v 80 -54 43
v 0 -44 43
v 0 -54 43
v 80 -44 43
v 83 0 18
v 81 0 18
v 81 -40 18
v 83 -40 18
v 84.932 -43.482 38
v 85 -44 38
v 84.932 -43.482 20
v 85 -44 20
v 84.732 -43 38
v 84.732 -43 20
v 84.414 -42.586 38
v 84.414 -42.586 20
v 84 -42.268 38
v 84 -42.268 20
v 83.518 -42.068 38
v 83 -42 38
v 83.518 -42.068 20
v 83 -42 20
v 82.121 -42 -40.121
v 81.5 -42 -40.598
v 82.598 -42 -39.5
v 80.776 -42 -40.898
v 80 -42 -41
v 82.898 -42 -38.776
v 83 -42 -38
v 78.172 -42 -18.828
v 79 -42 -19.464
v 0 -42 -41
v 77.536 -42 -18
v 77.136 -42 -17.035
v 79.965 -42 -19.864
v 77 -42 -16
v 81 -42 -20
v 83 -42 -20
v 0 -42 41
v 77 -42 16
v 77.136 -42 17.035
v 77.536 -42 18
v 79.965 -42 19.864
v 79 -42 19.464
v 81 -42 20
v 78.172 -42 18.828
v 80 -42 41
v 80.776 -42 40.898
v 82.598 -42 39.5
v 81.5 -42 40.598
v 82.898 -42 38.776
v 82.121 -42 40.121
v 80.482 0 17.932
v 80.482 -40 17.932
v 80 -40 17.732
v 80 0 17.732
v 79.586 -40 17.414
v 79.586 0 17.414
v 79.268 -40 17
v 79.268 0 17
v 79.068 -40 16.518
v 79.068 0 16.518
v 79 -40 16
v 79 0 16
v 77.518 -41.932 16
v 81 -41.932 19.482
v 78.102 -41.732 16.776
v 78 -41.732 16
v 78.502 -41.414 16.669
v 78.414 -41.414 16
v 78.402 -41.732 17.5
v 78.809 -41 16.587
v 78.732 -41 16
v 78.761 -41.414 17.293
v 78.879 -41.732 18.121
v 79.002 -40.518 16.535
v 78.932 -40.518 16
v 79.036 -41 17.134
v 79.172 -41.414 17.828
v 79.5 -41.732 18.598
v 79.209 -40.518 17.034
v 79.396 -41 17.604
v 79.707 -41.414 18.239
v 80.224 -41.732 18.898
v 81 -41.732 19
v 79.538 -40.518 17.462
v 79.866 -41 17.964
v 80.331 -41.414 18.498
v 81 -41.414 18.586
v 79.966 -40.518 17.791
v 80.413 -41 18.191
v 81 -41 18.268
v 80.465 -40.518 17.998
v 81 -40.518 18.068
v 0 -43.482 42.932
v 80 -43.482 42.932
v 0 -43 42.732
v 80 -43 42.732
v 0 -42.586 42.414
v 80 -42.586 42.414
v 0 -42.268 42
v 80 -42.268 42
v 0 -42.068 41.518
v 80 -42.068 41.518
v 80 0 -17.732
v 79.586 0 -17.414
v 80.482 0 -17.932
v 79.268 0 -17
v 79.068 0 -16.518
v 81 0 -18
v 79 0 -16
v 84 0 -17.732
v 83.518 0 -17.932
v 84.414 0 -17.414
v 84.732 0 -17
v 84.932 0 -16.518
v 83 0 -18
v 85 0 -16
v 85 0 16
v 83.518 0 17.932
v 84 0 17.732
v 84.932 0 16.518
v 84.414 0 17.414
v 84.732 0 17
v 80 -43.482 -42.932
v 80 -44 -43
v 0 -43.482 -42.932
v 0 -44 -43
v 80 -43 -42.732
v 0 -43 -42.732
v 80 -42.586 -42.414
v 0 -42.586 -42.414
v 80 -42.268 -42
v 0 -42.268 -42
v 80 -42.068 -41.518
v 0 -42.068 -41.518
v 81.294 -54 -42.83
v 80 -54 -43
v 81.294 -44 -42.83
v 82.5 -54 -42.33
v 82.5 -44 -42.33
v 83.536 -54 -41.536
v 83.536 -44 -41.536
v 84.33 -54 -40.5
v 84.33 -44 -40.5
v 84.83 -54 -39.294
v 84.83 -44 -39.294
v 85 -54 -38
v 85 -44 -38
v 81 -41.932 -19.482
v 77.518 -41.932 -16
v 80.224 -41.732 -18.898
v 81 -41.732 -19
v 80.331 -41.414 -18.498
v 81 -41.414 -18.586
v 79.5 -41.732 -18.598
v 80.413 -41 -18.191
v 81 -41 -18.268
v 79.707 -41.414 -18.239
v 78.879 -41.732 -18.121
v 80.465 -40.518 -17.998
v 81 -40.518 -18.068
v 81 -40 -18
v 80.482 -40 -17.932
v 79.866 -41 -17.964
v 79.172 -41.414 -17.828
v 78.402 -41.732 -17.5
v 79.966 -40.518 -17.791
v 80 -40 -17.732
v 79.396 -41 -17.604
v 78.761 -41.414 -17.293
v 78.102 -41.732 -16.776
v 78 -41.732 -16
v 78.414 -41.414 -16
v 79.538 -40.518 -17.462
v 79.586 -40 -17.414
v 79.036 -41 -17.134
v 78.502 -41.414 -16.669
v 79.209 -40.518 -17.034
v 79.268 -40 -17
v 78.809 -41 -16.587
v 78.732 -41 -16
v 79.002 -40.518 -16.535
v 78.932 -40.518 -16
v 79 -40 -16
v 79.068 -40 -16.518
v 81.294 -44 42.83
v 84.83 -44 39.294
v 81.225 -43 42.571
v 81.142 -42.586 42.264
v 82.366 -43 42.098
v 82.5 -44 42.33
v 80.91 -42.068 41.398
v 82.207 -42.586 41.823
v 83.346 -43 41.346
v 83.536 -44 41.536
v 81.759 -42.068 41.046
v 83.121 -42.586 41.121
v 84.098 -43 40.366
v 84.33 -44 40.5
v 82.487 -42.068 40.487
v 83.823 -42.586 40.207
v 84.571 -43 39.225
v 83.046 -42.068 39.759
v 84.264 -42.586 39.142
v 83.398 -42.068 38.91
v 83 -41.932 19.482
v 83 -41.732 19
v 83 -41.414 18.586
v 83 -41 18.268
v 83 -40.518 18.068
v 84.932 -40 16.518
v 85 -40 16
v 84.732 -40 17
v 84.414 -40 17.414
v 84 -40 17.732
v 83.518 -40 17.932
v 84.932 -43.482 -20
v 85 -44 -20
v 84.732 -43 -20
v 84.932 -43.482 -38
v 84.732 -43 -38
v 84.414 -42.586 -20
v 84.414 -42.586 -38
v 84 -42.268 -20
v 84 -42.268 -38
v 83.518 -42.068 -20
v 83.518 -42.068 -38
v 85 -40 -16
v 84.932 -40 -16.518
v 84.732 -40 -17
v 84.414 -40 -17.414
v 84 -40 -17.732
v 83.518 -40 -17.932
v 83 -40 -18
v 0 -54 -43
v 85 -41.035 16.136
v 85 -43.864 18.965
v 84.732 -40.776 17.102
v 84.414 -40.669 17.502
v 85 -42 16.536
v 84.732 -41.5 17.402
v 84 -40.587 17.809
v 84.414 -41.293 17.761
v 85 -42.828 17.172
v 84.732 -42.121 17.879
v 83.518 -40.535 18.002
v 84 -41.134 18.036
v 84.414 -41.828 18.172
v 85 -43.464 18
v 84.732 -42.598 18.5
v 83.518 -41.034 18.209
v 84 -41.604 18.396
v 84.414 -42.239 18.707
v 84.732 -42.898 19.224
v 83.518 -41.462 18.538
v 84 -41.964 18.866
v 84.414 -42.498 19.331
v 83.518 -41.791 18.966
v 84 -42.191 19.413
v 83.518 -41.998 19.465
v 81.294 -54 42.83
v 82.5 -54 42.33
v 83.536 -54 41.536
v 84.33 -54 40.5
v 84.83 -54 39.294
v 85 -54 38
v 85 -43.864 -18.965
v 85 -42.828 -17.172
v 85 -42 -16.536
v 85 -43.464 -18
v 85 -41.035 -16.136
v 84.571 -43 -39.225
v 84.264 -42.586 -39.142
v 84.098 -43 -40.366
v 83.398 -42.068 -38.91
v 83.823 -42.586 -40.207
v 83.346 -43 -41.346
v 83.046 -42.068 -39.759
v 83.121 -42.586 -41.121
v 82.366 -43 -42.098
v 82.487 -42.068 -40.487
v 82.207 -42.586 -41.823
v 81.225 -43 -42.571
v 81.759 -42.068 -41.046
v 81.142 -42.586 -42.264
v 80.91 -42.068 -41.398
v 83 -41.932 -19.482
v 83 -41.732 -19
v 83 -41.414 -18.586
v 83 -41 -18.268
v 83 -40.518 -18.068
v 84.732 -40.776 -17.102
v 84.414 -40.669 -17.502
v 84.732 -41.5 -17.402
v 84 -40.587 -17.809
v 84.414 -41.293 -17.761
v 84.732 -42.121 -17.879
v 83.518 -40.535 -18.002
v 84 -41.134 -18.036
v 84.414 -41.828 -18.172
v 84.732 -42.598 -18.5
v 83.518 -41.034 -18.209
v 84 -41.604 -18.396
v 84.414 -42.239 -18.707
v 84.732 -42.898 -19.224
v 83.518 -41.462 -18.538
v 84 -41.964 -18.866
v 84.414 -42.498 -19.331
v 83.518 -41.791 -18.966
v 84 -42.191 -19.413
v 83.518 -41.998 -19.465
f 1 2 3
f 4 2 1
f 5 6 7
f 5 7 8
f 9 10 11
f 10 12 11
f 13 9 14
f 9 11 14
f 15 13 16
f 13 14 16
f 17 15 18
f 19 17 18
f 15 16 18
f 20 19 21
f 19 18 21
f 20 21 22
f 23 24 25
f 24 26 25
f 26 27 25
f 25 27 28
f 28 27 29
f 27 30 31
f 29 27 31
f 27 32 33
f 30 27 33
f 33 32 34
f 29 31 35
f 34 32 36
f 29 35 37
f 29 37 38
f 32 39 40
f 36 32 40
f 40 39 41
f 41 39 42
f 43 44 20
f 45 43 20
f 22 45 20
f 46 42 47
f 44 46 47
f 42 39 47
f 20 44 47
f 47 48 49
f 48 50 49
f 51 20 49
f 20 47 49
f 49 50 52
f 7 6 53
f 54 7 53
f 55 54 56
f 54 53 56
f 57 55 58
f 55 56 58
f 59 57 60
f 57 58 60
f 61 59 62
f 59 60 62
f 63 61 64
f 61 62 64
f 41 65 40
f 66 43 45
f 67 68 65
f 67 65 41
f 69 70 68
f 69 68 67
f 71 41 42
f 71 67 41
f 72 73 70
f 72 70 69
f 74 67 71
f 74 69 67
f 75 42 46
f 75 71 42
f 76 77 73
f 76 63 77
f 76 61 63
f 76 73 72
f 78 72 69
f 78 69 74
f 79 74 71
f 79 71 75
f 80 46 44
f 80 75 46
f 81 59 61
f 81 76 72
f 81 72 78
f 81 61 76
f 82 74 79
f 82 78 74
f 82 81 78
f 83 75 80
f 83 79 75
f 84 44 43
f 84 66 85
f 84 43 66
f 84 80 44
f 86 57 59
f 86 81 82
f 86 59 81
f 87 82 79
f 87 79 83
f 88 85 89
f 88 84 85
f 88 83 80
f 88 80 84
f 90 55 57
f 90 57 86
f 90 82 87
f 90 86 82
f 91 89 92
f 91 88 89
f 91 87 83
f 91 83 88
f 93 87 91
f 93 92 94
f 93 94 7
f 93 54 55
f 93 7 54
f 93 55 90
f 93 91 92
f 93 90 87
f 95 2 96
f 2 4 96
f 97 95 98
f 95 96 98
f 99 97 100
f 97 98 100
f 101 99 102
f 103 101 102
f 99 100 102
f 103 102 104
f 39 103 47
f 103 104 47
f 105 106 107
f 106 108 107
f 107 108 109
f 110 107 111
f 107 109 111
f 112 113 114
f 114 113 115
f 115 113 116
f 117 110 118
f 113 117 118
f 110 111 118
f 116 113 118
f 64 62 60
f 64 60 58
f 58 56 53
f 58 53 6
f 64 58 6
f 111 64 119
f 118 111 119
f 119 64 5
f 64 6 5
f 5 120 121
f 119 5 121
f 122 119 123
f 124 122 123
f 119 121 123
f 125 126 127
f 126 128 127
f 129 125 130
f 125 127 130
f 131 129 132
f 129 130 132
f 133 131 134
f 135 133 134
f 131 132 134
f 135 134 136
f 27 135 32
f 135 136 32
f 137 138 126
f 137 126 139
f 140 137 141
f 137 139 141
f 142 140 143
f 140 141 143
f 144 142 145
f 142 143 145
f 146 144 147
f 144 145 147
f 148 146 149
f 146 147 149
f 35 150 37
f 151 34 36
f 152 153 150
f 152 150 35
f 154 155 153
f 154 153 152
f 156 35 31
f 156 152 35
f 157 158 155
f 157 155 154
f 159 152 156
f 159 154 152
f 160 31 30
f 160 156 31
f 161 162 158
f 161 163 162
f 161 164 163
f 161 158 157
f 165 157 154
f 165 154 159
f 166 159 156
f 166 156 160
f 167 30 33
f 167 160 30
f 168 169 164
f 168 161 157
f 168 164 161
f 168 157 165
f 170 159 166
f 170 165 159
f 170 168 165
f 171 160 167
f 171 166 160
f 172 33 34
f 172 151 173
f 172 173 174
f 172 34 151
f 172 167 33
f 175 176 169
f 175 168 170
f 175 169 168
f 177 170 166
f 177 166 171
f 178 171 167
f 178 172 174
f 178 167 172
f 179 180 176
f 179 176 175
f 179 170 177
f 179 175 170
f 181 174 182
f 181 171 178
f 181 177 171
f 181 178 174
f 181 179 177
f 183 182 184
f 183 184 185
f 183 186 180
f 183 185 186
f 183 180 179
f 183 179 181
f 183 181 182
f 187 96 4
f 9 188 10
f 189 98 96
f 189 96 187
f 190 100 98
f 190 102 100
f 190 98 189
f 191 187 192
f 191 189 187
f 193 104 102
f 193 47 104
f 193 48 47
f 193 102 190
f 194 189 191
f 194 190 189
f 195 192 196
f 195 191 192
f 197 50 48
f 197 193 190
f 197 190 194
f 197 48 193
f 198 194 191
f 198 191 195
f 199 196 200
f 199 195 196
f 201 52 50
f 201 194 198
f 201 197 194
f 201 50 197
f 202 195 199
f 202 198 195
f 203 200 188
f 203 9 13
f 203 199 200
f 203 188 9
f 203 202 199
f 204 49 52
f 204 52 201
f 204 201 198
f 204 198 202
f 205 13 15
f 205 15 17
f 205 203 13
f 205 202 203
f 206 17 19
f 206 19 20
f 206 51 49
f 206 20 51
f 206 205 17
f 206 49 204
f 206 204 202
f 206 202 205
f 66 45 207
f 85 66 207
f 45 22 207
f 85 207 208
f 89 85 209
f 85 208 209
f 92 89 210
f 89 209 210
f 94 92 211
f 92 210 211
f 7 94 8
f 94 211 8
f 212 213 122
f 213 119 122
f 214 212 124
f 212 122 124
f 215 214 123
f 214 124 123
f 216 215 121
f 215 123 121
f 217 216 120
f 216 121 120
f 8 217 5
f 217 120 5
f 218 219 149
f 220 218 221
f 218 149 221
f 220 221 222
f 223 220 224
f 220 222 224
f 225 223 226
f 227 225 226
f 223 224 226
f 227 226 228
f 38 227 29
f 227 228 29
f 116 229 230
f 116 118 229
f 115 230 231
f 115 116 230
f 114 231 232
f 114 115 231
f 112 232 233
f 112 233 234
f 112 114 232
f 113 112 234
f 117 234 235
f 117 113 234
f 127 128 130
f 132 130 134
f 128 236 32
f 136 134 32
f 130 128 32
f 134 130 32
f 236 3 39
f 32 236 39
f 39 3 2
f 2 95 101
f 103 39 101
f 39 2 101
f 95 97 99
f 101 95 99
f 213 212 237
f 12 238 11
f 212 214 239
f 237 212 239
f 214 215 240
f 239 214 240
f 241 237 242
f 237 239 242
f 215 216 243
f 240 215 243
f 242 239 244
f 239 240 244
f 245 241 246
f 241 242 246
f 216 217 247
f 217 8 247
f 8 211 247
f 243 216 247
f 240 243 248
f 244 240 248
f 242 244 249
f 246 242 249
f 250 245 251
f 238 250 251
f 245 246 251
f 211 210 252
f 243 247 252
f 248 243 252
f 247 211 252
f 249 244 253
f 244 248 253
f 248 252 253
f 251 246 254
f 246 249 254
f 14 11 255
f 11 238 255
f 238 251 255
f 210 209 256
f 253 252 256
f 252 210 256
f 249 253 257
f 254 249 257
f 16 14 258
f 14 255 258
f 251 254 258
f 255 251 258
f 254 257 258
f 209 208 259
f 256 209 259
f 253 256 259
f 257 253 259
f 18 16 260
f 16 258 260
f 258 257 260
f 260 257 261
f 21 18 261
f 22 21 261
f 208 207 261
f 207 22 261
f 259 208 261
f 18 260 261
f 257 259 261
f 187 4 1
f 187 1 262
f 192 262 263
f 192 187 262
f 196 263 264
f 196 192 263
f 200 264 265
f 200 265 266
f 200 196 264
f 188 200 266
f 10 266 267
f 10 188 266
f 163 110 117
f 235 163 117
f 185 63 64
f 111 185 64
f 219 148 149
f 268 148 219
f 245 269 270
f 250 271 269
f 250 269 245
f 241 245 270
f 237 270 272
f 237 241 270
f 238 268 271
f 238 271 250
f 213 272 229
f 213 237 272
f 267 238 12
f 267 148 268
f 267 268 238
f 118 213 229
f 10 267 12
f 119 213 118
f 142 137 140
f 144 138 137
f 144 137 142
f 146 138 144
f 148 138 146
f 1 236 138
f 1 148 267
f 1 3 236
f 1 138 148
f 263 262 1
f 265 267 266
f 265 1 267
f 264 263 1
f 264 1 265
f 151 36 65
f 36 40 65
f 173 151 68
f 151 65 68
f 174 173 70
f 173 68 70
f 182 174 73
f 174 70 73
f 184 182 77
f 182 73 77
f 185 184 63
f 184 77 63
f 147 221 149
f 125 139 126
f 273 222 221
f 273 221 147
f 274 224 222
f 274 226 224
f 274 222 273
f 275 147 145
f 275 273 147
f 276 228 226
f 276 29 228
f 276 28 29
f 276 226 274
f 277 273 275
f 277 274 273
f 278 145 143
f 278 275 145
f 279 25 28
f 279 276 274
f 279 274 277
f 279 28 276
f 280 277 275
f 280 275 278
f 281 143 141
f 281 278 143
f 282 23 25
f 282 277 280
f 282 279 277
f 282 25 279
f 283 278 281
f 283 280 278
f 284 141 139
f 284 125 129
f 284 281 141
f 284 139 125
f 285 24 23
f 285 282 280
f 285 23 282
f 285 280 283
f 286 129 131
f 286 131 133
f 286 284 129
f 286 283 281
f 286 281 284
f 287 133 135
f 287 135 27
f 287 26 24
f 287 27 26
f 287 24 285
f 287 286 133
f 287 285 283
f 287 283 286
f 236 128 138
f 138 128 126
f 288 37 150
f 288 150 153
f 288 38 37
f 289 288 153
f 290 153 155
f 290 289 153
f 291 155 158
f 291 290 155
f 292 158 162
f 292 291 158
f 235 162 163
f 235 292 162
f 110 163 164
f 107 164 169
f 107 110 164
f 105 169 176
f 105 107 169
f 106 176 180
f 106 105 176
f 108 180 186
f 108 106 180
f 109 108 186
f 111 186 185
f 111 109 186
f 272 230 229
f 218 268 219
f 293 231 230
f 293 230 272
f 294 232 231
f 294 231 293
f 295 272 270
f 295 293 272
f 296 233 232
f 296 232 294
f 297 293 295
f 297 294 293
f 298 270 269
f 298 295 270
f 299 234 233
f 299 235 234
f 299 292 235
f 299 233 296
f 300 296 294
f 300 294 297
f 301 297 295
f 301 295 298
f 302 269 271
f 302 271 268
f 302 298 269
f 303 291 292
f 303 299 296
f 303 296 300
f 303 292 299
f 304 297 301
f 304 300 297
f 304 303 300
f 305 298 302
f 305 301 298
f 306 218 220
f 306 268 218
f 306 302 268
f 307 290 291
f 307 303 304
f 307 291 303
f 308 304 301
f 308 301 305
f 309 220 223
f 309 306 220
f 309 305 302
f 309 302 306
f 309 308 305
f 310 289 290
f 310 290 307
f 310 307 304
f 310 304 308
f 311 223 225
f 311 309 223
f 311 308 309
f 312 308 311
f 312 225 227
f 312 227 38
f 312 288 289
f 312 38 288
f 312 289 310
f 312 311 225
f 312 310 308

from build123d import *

# Parameters (mm, degrees)
SKETCH_1_W      = 85
SKETCH_1_H      = 12
EXTRUDE_1_DEPTH = 43
SKETCH_3_W      = 6
SKETCH_3_H      = 42
EXTRUDE_3_DEPTH = 18
FILLET_1_R      = 5
FILLET_2_R      = 2


with BuildPart() as part:
    # 草圖1 → 伸長1 (new, symmetric)
    with BuildSketch(Plane.XY):
        with Locations((42.5, -48)):
            Rectangle(SKETCH_1_W, SKETCH_1_H)
    extrude(amount=EXTRUDE_1_DEPTH, both=True)

    # 草圖3 → 伸長3 (add, symmetric)
    with BuildSketch(Plane.XY):
        with Locations((82, -21)):
            Rectangle(SKETCH_3_W, SKETCH_3_H)
    extrude(amount=EXTRUDE_3_DEPTH, both=True)

    # 圓角1
    fillet_1_edges = [part.edges().sort_by_distance(p)[0] for p in [
        (85, -48, -43),
        (85, -48, 43),
    ]]
    fillet(fillet_1_edges, radius=FILLET_1_R)

    # 圓角2
    fillet_2_edges = [part.edges().sort_by_distance(p)[0] for p in [
        (85, -42, -28),
        (82, -42, -18),
        (79, -42, 0),
        (85, -21, -18),
        (79, -21, -18),
        (82, -42, 18),
        (85, -21, 18),
        (79, -21, 18),
        (85, -42, 28),
        (40, -42, -43),
        (40, -42, 43),
        (83.535533906, -42, 41.535533906),
        (83.535533906, -42, -41.535533906),
    ]]
    fillet(fillet_2_edges, radius=FILLET_2_R)


solid = part.part
